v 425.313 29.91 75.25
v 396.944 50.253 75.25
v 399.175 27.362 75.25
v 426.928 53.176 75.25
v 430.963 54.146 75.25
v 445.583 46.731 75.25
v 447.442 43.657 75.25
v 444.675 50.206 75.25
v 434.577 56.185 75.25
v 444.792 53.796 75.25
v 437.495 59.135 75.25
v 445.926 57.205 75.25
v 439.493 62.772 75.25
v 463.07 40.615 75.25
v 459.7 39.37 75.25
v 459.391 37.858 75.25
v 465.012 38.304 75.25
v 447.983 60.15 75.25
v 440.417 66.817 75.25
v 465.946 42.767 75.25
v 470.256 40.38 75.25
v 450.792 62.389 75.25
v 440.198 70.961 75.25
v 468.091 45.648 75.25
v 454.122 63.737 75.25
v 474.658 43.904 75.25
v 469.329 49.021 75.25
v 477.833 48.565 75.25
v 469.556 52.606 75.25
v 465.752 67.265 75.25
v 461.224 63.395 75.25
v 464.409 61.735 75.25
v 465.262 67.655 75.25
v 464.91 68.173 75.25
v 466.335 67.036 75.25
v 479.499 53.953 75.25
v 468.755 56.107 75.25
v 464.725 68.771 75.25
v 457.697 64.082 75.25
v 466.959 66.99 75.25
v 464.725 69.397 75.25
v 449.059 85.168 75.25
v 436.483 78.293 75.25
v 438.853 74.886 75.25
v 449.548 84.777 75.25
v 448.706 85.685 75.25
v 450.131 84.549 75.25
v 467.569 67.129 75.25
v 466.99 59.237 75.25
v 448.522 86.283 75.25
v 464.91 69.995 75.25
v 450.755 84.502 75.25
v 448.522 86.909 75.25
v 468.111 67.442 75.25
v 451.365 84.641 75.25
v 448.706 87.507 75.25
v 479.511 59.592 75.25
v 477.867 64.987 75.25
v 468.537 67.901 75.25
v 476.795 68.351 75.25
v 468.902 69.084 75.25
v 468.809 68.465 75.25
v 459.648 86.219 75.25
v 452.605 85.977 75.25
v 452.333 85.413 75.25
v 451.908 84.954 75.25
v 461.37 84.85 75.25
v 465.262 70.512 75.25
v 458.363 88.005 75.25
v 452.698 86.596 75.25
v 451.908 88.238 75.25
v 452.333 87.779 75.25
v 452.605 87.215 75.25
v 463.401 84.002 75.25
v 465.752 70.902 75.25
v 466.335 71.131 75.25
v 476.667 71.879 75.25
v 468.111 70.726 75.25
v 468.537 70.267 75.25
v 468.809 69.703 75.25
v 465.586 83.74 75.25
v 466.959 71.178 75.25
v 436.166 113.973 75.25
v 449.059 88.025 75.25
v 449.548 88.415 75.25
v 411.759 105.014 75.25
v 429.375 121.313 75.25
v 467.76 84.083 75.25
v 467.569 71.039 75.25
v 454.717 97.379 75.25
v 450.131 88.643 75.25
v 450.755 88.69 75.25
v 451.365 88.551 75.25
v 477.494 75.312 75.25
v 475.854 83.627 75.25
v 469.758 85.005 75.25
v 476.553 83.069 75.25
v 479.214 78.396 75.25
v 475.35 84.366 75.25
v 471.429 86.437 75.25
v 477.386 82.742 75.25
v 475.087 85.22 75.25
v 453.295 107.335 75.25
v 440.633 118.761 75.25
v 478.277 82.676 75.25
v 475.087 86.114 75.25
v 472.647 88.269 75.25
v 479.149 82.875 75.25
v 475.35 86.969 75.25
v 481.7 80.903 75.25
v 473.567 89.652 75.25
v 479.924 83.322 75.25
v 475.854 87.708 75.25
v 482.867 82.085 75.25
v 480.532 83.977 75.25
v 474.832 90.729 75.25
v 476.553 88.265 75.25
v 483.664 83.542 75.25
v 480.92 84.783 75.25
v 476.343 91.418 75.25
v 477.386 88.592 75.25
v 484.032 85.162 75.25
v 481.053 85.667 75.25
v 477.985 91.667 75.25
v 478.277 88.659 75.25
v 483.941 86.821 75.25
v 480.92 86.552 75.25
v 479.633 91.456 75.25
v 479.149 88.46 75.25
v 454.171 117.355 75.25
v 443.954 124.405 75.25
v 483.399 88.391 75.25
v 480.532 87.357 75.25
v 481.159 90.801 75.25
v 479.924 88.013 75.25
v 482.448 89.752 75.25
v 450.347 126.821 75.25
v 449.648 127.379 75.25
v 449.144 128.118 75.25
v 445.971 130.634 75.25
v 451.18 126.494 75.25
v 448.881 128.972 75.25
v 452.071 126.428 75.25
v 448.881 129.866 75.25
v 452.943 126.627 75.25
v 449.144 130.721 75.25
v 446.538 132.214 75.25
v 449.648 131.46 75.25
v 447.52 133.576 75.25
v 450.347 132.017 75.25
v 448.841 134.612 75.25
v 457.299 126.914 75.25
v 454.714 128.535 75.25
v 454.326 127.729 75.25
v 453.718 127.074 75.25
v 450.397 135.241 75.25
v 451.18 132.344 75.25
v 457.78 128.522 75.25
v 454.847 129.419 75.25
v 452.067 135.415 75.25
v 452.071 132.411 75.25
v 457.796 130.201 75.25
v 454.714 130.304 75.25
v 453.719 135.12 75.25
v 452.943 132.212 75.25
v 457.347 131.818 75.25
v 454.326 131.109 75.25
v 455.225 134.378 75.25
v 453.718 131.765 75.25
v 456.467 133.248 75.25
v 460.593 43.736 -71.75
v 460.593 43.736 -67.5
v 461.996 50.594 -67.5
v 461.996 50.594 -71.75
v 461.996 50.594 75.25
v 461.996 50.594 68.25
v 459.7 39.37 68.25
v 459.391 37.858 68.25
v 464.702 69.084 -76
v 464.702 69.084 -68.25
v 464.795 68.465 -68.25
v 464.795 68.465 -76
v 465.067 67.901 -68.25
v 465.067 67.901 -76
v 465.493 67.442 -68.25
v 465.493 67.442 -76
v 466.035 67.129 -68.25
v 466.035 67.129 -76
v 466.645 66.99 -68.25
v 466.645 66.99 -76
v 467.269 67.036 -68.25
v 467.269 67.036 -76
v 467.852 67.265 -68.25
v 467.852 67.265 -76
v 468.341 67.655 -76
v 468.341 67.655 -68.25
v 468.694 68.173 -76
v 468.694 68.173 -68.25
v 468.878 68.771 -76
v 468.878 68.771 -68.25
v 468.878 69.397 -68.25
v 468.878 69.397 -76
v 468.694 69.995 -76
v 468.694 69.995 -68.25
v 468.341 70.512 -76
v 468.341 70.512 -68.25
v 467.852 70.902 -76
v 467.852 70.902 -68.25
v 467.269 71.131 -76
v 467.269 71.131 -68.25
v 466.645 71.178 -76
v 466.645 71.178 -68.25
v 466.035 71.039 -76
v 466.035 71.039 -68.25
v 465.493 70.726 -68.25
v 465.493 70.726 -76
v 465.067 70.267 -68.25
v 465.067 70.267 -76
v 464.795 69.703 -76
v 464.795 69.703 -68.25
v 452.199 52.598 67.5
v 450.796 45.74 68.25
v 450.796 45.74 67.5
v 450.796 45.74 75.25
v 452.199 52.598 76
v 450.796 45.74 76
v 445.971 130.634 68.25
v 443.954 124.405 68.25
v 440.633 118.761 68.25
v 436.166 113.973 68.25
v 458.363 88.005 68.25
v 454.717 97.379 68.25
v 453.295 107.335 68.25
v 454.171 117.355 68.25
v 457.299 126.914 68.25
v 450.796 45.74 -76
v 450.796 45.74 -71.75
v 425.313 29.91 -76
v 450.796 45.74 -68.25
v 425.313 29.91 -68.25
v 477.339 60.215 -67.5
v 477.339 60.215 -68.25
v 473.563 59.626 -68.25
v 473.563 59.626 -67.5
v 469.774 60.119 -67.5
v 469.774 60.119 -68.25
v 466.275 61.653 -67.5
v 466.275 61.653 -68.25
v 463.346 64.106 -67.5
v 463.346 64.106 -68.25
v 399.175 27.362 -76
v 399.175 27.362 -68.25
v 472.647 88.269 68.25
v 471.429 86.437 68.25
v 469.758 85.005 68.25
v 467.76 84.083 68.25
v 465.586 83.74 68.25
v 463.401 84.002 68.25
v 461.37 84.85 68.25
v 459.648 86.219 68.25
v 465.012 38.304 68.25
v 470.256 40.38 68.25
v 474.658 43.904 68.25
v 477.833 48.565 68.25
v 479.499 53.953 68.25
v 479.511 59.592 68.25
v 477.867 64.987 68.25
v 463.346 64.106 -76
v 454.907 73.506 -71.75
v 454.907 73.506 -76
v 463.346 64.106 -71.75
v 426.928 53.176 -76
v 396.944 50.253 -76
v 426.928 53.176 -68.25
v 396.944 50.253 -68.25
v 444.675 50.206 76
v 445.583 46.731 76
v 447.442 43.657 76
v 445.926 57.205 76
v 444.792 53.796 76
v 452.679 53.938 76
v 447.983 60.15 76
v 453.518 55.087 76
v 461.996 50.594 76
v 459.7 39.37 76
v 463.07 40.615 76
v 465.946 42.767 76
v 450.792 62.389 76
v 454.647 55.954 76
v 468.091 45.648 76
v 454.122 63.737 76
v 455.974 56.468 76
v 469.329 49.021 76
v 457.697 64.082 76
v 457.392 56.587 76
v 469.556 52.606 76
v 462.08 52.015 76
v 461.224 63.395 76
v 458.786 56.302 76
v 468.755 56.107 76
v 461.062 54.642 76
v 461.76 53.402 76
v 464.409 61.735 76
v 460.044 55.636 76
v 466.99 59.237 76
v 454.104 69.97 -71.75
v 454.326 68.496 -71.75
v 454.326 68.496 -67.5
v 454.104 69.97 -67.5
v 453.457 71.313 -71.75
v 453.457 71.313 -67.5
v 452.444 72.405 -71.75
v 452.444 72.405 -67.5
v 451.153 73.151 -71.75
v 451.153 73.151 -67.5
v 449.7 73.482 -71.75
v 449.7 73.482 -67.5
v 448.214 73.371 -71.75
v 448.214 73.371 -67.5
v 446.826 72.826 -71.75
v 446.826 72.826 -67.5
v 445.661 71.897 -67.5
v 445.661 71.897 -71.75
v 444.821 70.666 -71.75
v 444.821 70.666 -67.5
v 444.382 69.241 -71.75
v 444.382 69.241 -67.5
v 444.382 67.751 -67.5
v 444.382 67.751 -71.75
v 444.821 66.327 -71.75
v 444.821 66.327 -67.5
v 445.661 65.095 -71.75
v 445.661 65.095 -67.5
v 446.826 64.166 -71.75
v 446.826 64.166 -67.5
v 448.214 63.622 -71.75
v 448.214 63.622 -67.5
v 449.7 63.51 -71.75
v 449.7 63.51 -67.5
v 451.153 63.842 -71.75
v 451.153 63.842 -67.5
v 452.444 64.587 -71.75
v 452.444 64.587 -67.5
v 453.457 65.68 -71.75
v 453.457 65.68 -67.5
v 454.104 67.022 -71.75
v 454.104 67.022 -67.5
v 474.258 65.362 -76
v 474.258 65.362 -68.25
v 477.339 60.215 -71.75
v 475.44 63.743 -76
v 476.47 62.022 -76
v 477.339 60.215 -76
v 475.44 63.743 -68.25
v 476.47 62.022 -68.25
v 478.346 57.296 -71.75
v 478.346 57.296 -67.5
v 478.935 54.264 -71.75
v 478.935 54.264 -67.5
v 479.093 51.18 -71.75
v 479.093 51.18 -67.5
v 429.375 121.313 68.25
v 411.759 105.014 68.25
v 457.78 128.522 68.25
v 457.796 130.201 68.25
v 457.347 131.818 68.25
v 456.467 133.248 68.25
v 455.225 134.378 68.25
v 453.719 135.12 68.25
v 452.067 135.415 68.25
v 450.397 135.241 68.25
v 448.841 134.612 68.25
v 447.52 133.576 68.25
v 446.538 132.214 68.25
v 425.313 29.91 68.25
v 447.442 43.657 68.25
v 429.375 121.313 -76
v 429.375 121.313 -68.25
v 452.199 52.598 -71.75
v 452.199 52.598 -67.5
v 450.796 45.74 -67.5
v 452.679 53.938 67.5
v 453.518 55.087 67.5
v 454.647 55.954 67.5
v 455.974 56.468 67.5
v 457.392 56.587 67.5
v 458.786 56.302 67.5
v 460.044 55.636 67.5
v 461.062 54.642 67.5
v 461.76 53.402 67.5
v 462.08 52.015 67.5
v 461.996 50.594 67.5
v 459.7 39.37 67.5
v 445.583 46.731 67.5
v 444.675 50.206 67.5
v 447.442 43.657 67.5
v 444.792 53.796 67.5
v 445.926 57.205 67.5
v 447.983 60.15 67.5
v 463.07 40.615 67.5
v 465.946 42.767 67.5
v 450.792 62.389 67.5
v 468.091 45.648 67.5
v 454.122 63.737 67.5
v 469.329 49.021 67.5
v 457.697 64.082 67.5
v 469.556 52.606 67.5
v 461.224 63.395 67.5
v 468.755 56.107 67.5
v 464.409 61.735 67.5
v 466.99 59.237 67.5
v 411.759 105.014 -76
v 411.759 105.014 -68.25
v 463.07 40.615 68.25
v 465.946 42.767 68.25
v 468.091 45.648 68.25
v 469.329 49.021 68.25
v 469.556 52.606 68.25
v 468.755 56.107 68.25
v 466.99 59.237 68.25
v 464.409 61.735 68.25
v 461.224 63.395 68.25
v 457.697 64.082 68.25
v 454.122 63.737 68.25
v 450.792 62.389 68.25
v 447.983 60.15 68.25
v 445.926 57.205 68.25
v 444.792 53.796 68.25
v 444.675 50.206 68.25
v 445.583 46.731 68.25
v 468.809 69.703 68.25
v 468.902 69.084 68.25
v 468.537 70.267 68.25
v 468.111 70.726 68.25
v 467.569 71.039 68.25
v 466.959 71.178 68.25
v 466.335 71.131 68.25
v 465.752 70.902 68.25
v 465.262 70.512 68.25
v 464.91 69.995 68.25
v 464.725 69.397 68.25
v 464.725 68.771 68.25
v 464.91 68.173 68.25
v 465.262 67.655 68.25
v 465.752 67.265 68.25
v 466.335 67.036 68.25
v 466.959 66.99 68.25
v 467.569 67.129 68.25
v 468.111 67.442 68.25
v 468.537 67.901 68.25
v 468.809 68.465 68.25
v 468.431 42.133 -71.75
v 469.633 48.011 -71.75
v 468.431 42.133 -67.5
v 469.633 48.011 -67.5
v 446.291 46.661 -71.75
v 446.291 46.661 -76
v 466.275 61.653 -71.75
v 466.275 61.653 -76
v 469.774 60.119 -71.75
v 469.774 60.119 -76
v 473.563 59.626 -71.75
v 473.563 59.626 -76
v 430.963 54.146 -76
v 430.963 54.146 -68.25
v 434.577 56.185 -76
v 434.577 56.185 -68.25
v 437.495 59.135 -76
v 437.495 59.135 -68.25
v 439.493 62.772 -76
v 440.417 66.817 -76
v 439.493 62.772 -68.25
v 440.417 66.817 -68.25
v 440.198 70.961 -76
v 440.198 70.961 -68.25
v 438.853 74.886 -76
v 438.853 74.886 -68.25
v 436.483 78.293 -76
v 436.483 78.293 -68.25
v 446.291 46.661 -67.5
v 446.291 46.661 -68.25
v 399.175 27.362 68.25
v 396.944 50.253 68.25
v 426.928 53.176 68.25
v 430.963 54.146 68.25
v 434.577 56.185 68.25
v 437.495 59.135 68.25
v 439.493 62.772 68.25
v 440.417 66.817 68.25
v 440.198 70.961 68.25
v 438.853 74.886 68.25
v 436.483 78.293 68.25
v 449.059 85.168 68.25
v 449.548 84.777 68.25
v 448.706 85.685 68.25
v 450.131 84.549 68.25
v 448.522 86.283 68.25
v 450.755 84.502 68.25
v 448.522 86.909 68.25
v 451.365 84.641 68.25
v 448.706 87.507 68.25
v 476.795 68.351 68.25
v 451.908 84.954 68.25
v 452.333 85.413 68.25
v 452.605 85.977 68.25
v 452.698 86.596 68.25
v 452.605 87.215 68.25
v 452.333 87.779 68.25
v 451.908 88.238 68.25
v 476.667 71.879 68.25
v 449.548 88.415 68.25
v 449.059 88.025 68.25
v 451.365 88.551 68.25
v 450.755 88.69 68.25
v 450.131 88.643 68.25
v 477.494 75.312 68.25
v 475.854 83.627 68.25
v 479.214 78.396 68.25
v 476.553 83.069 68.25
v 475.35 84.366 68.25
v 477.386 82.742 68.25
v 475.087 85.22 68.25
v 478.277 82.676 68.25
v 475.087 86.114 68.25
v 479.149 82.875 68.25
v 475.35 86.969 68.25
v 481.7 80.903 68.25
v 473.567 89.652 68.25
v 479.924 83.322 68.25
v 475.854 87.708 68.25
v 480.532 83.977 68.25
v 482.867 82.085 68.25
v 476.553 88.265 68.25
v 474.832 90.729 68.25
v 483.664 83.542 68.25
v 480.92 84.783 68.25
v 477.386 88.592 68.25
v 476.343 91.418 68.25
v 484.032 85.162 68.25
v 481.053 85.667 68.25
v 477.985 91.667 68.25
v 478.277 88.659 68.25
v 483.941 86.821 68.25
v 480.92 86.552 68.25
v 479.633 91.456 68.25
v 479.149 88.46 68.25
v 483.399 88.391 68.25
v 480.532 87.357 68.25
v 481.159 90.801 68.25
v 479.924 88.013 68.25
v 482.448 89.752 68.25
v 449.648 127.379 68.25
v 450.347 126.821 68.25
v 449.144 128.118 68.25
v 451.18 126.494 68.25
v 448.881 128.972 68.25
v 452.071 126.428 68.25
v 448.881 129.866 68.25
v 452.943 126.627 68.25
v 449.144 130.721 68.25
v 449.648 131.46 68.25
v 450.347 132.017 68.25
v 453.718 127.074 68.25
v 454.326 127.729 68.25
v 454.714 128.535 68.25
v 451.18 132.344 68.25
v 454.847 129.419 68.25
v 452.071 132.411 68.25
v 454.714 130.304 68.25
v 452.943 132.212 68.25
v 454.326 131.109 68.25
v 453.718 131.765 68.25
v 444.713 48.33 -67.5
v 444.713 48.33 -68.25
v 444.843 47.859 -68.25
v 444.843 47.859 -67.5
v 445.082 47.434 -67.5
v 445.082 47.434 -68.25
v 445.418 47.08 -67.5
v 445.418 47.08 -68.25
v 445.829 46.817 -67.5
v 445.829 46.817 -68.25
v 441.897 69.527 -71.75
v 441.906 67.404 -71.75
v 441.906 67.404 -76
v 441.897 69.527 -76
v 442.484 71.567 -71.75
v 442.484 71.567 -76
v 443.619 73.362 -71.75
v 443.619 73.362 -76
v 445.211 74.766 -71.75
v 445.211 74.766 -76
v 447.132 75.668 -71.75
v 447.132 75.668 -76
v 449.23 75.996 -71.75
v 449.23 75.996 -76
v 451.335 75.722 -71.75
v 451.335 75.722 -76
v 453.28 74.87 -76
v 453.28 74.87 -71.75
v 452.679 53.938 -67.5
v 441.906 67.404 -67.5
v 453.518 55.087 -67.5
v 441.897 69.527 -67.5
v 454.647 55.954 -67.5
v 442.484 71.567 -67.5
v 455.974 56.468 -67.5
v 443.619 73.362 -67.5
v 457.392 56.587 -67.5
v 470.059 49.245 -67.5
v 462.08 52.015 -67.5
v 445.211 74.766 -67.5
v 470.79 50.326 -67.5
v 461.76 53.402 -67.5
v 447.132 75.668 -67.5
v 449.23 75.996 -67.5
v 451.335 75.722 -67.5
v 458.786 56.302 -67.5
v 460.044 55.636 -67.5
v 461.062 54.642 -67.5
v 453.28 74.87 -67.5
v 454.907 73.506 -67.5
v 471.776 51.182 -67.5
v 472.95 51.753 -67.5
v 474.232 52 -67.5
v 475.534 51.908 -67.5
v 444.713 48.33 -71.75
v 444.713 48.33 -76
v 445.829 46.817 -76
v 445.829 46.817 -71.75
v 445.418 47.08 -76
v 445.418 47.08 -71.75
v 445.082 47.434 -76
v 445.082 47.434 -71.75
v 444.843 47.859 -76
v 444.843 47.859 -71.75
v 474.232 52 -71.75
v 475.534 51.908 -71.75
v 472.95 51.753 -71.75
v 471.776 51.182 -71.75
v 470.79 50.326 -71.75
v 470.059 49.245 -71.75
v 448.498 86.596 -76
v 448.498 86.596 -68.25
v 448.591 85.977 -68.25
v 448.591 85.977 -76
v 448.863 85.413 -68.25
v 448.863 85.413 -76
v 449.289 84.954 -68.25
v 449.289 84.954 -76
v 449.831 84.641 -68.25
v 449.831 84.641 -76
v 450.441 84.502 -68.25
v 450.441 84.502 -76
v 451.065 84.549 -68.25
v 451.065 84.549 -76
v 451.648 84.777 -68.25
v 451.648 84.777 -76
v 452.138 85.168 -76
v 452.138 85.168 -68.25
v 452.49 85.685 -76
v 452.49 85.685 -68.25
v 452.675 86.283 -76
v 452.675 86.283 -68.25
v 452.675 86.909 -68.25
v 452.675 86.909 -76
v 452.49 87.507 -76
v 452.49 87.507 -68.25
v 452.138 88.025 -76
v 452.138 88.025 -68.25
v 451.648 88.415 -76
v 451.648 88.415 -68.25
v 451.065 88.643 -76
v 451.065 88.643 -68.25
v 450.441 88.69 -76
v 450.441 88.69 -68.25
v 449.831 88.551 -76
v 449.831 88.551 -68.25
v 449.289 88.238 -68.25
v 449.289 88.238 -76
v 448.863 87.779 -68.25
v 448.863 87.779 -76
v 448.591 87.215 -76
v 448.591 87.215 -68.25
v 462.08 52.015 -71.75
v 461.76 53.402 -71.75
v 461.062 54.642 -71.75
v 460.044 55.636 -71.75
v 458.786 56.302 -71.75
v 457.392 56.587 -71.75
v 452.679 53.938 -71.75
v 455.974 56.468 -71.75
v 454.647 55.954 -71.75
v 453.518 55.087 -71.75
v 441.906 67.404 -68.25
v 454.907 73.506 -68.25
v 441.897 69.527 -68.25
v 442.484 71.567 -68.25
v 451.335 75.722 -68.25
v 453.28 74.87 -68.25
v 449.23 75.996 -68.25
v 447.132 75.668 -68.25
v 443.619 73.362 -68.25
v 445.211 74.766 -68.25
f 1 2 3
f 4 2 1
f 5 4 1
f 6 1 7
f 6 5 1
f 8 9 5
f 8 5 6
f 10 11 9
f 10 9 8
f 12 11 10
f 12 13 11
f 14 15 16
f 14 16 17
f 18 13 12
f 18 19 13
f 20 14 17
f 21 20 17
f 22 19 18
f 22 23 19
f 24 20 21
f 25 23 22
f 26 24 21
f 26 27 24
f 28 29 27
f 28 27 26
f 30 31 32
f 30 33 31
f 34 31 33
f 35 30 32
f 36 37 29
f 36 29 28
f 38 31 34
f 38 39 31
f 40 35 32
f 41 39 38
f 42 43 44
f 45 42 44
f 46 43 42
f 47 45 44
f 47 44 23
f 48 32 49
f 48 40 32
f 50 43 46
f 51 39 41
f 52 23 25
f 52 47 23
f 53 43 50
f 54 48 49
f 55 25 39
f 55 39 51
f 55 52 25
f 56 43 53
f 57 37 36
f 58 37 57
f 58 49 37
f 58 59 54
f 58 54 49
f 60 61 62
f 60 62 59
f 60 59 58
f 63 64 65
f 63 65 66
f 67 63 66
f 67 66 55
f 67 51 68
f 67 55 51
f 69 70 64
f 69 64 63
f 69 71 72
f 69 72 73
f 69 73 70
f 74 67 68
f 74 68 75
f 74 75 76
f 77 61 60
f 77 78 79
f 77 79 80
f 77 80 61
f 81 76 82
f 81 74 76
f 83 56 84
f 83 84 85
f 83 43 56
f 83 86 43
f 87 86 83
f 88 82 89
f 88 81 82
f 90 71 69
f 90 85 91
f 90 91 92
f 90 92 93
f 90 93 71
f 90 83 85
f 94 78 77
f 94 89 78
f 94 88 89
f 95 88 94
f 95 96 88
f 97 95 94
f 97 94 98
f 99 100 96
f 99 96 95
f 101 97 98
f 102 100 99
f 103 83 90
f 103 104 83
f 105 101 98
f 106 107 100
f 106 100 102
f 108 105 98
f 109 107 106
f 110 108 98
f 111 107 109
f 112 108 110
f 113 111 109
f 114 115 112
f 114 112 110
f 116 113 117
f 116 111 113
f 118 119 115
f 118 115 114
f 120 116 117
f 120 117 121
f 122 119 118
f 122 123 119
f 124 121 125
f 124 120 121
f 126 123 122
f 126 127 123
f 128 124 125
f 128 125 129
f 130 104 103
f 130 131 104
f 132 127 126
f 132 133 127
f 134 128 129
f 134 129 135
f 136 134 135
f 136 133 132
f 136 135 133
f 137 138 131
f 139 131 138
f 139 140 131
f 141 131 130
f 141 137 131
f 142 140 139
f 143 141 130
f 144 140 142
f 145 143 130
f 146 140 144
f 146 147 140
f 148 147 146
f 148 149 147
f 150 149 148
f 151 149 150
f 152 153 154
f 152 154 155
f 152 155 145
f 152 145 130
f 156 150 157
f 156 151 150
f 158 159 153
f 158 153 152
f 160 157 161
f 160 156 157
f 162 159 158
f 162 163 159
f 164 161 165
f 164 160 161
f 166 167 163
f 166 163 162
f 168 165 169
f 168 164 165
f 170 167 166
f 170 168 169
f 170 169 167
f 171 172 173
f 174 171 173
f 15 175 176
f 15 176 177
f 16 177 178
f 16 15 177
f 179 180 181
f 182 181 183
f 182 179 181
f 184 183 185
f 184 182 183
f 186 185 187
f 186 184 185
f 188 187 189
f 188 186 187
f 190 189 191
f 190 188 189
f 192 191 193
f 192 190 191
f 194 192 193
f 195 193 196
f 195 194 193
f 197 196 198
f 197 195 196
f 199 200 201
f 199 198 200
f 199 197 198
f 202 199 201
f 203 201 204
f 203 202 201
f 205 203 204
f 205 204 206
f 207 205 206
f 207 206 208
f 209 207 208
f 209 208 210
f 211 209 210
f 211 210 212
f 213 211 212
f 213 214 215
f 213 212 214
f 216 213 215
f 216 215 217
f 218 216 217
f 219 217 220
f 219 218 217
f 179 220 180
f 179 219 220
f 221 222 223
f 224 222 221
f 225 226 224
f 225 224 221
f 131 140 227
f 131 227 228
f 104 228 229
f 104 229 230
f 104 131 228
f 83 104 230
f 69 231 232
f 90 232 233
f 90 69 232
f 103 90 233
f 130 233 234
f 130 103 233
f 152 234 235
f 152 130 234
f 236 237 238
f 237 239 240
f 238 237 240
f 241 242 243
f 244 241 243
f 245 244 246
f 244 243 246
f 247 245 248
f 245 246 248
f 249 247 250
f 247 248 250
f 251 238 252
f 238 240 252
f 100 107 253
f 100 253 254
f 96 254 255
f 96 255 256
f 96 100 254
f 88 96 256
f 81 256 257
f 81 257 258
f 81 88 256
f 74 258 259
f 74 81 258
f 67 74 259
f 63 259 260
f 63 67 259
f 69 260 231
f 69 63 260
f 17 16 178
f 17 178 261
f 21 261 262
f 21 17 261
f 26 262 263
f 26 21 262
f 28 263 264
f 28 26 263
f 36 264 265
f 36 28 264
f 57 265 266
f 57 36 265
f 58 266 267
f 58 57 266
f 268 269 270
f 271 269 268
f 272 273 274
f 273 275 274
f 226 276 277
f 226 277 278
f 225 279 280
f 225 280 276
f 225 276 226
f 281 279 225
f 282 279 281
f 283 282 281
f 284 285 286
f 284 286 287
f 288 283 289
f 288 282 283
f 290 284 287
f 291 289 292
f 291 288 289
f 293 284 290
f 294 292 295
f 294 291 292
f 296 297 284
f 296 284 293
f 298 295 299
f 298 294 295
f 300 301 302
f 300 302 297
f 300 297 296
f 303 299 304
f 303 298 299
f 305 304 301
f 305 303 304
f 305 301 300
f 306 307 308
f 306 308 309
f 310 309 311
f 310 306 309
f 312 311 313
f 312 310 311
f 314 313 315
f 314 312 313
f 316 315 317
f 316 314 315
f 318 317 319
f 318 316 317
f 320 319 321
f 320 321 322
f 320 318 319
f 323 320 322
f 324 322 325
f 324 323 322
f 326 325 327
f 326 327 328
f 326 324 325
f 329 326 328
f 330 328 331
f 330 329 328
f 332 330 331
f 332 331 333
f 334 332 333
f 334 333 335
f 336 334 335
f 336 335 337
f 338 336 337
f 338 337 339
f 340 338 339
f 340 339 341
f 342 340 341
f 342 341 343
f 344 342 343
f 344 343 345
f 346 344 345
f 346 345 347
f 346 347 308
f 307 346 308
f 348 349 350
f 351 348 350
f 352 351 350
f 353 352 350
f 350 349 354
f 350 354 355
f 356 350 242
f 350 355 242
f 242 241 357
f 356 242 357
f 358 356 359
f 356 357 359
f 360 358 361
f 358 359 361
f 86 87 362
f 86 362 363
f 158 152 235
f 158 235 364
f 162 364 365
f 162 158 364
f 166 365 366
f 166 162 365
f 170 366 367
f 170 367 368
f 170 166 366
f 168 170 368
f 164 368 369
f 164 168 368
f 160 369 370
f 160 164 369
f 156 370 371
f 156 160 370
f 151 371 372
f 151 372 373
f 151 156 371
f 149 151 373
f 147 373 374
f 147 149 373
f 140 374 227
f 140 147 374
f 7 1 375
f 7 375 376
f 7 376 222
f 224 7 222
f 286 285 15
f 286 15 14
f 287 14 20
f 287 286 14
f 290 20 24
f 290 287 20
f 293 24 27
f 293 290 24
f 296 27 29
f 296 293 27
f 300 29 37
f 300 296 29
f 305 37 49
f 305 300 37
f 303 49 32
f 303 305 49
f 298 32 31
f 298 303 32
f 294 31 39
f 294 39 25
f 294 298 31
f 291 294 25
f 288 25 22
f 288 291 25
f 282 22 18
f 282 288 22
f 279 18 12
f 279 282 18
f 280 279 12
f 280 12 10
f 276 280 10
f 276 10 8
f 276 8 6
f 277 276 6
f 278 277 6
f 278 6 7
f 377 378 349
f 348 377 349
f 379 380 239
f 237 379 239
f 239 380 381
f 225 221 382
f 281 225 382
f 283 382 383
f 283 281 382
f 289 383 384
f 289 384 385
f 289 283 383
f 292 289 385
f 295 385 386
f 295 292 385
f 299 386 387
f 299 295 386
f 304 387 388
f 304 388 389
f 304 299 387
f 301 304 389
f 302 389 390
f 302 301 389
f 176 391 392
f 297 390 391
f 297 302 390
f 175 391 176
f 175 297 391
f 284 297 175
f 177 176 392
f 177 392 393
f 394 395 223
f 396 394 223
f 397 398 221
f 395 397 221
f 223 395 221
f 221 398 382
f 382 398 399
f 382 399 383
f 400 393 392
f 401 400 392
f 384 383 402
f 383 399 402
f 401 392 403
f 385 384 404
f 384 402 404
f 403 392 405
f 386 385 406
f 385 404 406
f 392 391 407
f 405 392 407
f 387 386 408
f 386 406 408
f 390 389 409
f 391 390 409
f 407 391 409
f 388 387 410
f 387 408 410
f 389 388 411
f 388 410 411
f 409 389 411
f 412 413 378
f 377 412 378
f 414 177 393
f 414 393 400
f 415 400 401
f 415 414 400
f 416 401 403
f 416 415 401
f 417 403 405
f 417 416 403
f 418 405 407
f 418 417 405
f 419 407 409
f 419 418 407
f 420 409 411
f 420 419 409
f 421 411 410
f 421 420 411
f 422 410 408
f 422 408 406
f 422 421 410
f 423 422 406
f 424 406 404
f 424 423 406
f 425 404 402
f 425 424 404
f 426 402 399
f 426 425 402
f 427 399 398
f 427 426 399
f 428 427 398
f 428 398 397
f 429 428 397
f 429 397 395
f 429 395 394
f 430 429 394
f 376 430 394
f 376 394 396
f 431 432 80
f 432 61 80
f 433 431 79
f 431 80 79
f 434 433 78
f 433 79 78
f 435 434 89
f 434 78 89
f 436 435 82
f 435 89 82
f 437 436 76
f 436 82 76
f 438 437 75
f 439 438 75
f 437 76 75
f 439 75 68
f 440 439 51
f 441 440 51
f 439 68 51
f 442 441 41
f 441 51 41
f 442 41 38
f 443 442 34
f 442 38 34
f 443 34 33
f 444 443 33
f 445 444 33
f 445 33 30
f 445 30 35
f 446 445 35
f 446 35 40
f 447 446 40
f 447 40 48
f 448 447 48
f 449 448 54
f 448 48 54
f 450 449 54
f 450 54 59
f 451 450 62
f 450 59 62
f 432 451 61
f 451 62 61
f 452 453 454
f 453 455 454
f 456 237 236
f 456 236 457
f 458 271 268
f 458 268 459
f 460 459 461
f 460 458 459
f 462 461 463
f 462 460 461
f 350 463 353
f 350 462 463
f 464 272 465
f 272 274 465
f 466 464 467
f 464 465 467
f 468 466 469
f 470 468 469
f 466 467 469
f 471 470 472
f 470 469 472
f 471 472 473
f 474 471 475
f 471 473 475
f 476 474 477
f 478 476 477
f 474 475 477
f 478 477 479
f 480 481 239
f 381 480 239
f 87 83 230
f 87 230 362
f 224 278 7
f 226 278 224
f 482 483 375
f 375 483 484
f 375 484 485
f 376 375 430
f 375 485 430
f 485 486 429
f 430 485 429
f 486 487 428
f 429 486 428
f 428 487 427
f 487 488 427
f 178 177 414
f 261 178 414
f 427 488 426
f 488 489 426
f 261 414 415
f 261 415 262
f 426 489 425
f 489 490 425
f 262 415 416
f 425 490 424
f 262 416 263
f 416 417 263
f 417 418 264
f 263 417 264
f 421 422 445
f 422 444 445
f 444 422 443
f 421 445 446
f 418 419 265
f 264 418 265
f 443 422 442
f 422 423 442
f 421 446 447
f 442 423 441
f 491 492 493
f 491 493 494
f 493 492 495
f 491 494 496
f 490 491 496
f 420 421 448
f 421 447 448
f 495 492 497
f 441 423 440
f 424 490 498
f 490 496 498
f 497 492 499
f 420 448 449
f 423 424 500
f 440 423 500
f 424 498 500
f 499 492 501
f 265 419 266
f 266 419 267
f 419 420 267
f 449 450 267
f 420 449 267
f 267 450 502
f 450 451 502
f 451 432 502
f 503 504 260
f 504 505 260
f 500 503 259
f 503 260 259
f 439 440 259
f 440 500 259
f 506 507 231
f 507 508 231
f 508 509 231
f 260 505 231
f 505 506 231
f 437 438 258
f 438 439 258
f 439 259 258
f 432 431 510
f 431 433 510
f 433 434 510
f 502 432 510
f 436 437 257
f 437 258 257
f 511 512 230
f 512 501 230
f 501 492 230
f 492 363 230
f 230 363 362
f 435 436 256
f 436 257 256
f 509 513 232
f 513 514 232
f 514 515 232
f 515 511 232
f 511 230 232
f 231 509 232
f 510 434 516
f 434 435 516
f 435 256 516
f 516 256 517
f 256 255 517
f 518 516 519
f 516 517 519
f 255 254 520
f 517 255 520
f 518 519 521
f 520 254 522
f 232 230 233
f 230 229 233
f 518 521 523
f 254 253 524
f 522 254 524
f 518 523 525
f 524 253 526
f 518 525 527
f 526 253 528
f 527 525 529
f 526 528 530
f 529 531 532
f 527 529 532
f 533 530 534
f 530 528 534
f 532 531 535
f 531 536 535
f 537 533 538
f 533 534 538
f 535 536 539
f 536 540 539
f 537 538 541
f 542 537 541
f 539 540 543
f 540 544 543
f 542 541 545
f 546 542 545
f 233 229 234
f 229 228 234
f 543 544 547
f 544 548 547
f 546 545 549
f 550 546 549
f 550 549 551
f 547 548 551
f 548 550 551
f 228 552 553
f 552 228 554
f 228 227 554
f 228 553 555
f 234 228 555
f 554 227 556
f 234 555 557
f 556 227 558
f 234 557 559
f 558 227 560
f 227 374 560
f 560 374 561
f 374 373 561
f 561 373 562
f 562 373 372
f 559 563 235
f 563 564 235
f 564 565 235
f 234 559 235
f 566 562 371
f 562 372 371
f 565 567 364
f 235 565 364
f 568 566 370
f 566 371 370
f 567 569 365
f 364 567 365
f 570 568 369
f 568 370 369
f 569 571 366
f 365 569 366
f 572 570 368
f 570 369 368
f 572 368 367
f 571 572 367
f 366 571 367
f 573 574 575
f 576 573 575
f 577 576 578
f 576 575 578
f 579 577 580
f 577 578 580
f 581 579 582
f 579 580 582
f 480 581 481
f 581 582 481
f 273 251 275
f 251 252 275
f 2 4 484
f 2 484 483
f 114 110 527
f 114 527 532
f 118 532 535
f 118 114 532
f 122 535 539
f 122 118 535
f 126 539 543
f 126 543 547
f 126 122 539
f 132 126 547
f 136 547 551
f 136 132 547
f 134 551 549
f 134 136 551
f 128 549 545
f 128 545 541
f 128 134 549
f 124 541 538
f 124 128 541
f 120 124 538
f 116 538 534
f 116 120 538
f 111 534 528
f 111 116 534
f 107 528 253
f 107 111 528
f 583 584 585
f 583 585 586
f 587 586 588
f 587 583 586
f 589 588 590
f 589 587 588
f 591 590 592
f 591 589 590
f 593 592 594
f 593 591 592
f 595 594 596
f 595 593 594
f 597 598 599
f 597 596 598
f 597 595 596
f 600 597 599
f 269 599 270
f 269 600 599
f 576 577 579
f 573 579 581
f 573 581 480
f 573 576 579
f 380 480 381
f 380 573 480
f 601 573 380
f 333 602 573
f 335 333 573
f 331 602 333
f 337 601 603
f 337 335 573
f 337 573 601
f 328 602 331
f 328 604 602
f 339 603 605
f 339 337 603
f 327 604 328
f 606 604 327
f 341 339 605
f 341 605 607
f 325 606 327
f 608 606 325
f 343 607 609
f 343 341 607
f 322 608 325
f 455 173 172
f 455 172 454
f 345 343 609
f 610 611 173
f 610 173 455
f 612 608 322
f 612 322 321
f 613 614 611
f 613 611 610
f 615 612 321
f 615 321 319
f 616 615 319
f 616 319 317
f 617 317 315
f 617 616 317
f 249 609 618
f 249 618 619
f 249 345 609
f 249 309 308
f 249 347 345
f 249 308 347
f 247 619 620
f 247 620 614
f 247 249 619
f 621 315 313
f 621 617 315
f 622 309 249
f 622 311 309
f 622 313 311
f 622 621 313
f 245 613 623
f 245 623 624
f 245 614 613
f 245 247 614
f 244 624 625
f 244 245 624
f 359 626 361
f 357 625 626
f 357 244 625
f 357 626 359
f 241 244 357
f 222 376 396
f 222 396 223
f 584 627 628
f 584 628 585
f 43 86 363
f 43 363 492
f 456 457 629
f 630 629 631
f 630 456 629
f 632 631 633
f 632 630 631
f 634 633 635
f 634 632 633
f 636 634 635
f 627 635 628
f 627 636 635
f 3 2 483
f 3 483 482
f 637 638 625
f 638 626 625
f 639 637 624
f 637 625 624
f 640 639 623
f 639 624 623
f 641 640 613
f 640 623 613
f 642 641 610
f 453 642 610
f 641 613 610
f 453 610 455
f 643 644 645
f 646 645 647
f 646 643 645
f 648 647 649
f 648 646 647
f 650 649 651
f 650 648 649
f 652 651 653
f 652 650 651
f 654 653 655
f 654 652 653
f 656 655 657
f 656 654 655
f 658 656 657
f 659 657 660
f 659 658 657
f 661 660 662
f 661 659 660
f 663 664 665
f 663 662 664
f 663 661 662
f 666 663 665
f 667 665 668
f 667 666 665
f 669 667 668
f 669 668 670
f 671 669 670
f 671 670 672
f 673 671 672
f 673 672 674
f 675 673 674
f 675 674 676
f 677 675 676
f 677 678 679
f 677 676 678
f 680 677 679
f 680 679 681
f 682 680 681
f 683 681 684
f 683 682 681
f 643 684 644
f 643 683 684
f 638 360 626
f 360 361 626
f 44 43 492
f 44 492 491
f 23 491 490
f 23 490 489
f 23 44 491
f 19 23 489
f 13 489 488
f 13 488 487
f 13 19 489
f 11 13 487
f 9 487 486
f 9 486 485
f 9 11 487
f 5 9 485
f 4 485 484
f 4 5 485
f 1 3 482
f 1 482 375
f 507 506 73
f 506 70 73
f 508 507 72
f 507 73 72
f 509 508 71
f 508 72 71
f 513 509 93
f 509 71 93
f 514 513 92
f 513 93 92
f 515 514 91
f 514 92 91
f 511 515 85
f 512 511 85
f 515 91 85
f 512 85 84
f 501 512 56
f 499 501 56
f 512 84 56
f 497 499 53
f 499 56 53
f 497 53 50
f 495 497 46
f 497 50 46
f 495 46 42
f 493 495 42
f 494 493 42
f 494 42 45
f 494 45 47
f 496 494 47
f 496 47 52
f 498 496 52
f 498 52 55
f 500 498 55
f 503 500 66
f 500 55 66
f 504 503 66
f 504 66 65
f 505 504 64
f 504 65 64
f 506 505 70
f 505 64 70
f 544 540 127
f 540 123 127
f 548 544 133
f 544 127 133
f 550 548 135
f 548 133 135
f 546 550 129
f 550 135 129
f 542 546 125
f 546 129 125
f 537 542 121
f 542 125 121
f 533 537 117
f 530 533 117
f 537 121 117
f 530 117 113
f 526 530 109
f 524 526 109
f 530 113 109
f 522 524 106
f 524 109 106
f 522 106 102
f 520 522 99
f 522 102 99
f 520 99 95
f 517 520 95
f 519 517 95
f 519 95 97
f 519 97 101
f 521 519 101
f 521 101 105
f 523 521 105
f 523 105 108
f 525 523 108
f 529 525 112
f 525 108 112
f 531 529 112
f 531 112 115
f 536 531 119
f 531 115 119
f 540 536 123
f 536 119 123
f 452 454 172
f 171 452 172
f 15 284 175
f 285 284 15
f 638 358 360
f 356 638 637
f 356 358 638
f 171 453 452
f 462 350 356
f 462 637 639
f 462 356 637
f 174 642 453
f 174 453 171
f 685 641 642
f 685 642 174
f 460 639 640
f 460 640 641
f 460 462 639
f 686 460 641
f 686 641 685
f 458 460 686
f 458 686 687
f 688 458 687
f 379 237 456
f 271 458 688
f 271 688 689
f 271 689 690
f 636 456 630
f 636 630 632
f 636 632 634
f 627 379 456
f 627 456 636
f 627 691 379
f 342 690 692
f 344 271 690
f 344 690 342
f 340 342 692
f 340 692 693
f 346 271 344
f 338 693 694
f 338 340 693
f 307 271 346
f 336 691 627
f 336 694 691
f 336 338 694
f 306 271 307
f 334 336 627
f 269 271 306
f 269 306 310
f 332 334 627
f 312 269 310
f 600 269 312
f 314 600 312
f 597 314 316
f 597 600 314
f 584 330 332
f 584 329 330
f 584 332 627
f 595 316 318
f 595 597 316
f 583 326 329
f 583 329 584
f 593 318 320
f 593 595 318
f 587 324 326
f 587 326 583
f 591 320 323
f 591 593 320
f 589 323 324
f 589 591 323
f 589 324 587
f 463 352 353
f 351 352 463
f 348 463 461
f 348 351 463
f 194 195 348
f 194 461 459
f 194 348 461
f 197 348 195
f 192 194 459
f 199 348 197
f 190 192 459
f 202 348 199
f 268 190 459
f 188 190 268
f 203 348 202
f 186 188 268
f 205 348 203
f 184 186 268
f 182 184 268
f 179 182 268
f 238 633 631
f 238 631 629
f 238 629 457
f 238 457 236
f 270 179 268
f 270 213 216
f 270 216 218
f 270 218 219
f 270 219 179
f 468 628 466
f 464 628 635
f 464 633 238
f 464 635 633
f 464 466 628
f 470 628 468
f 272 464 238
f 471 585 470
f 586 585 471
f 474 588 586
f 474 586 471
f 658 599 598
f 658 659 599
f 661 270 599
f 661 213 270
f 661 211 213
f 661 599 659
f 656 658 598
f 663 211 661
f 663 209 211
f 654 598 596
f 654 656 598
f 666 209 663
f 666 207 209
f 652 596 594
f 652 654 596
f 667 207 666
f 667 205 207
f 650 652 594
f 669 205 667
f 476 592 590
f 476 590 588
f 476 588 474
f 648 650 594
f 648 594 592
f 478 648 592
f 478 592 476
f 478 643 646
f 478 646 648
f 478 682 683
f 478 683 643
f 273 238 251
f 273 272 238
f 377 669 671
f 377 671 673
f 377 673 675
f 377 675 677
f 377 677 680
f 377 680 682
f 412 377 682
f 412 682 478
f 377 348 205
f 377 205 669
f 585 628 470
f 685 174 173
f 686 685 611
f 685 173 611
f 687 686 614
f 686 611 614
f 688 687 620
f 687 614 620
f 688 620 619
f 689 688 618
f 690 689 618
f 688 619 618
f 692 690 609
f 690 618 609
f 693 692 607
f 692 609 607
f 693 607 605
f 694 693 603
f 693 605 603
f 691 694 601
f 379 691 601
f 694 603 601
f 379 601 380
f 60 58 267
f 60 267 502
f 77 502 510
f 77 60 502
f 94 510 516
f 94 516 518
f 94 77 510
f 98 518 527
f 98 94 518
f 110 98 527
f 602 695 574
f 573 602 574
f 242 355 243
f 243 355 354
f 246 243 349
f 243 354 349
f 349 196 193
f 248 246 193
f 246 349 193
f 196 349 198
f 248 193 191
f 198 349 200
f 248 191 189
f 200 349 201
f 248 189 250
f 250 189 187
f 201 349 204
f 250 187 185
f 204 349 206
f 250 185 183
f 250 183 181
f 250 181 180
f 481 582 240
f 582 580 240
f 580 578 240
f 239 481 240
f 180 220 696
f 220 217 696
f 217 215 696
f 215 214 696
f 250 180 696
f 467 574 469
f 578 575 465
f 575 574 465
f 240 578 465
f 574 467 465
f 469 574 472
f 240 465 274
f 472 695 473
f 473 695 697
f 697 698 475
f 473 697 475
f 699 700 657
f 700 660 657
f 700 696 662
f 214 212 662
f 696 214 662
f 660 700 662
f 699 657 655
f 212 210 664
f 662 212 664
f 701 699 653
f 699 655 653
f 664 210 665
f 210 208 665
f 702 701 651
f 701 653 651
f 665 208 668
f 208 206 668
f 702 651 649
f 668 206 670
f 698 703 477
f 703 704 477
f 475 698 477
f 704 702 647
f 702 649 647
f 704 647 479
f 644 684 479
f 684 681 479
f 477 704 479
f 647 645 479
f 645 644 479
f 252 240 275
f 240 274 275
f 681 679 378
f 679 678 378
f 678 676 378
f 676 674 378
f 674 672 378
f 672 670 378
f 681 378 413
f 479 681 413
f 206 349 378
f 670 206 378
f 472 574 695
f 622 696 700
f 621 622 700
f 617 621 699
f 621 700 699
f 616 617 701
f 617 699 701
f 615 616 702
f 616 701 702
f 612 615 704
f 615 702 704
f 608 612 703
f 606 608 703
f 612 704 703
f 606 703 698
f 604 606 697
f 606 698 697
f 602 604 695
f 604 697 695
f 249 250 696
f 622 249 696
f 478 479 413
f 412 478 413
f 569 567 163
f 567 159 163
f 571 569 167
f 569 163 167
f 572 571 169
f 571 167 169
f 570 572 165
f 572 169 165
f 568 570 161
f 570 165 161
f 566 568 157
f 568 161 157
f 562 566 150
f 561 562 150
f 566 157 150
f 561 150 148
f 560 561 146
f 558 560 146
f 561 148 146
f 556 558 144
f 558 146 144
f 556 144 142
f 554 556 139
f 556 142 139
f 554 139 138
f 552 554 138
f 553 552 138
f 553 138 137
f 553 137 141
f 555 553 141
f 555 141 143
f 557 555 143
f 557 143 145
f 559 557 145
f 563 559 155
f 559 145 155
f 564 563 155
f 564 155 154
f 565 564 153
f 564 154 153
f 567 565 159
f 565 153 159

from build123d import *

# Parameters (mm, degrees)
EXTRUSION8_DEPTH             = 3.5
ESQUISSE25_R                 = 2.1
ESQUISSE25_R_2               = 3
ENL_V_MAT_EXTRU_7_DEPTH      = 4.5
ENL_V_MAT_EXTRU_7_DEPTH_BACK = 4.5
EXTRUSION9_DEPTH             = 4.25
EXTRUSION10_DEPTH            = 3.5
EXTRUSION10_DEPTH_BACK       = 4.25
ENL_V_MAT_EXTRU_8_DEPTH      = 5.25
EXTRUSION11_DEPTH            = 4.25
ENL_V_START                  = -4.25
ESQUISSE29_R                 = 5
ESQUISSE29_R_2               = 2.1
ENL_V_MAT_EXTRU_9_DEPTH      = 8.5


with BuildPart() as part:
    # Esquisse24 → Extrusion8 (new body, symmetric)
    with BuildSketch(Plane.XY.offset(71.75)):
        with BuildLine():
            Line((461.995766883, 50.594183039), (459.390681209, 37.857875543))
            ThreePointArc((459.390681209, 37.857875543), (476.419566024, 46.116324353), (477.86706581, 64.986661902))
            ThreePointArc((477.86706581, 64.986661902), (476.963568853, 73.623976526), (481.700303248, 80.902908999))
            ThreePointArc((481.700303248, 80.902908999), (481.840076705, 90.321321022), (472.646856003, 88.269318395))
            ThreePointArc((472.646856003, 88.269318395), (465.58603542, 83.740072967), (458.362772931, 88.005483904))
            ThreePointArc((458.362772931, 88.005483904), (453.294594284, 107.335459009), (457.298805353, 126.913524952))
            ThreePointArc((457.298805353, 126.913524952), (453.719385793, 135.119639281), (445.971344073, 130.634061698))
            ThreePointArc((445.971344073, 130.634061698), (442.447554772, 121.492162619), (436.166159284, 113.97315467))
            Line((436.166159284, 113.97315467), (429.374657578, 121.313148169))
            Line((429.374657578, 121.313148169), (411.758673179, 105.013544073))
            Line((411.758673179, 105.013544073), (436.482729278, 78.292736383))
            ThreePointArc((436.482729278, 78.292736383), (439.492589592, 62.772211826), (426.92820657, 53.176263674))
            Line((426.92820657, 53.176263674), (396.943666221, 50.253034947))
            Line((396.943666221, 50.253034947), (399.175383117, 27.361564053))
            Line((399.175383117, 27.361564053), (425.312556128, 29.909708333))
            Line((425.312556128, 29.909708333), (450.795868831, 45.740083367))
            Line((450.795868831, 45.740083367), (452.19860727, 52.598095095))
            ThreePointArc((452.19860727, 52.598095095), (458.099143105, 56.494718873), (461.995766883, 50.594183039))
        make_face()
    extrude(amount=EXTRUSION8_DEPTH, both=True)

    # Esquisse25 → Enlèv. mat.-Extru.7 (cut, two sides)
    with BuildSketch(Plane.XY.offset(71.75)) as enl_v_mat_extru_7_sk:
        with Locations((466.801883269, 69.083816781)):
            Circle(ESQUISSE25_R)
        with Locations((451.847076239, 129.419248335)):
            Circle(ESQUISSE25_R_2)
        with Locations((450.598194981, 86.596139067)):
            Circle(ESQUISSE25_R)
        with Locations((478.053275681, 85.667275685)):
            Circle(ESQUISSE25_R_2)
    extrude(amount=ENL_V_MAT_EXTRU_7_DEPTH, mode=Mode.SUBTRACT)
    extrude(enl_v_mat_extru_7_sk.sketch, amount=-ENL_V_MAT_EXTRU_7_DEPTH_BACK, mode=Mode.SUBTRACT)

    # Esquisse26 → Extrusion9 (add, symmetric)
    with BuildSketch(Plane.XY.offset(71.75)):
        with BuildLine():
            Line((461.995766883, 50.594183039), (459.699997211, 39.370126659))
            ThreePointArc((459.699997211, 39.370126659), (461.22355789, 63.395421414), (447.442283114, 43.65681734))
            Line((447.442283114, 43.65681734), (450.795868831, 45.740083367))
            Line((450.795868831, 45.740083367), (452.19860727, 52.598095095))
            ThreePointArc((452.19860727, 52.598095095), (458.099143105, 56.494718873), (461.995766883, 50.594183039))
        make_face()
    extrude(amount=EXTRUSION9_DEPTH, both=True)


with BuildPart() as body_2:
    # Esquisse27 → Extrusion10 (new body, two sides)
    with BuildSketch(Plane.XY.offset(-71.75)) as extrusion10_sk:
        with BuildLine():
            Line((429.374657578, 121.313148169), (474.257936186, 65.362354597))
            ThreePointArc((474.257936186, 65.362354597), (477.920241971, 58.695461914), (479.093248701, 51.179878309))
            Line((479.093248701, 51.179878309), (475.533639201, 51.90796121))
            ThreePointArc((475.533639201, 51.90796121), (471.776354076, 51.181690305), (469.633103367, 48.011337432))
            Line((469.633103367, 48.011337432), (468.430756133, 42.133041665))
            Line((468.430756133, 42.133041665), (460.593028443, 43.73617131))
            Line((460.593028443, 43.73617131), (461.995766883, 50.594183039))
            ThreePointArc((461.995766883, 50.594183039), (458.099143105, 56.494718873), (452.19860727, 52.598095095))
            Line((452.19860727, 52.598095095), (450.795868831, 45.740083367))
            Line((450.795868831, 45.740083367), (425.312556128, 29.909708333))
            Line((425.312556128, 29.909708333), (399.175383117, 27.361564053))
            Line((399.175383117, 27.361564053), (396.943666221, 50.253034947))
            Line((396.943666221, 50.253034947), (426.92820657, 53.176263674))
            ThreePointArc((426.92820657, 53.176263674), (439.492589592, 62.772211826), (436.482729278, 78.292736383))
            Line((436.482729278, 78.292736383), (411.758673179, 105.013544073))
            Line((411.758673179, 105.013544073), (429.374657578, 121.313148169))
        make_face()
    extrude(amount=EXTRUSION10_DEPTH)
    extrude(extrusion10_sk.sketch, amount=-EXTRUSION10_DEPTH_BACK)

    # Esquisse31 → Enlèv. mat.-Extru.8 (cut, through all)
    with BuildSketch(Plane.XY.offset(-71.75)):
        with BuildLine():
            Line((444.713406132, 48.32966438), (441.906110824, 67.404128849))
            ThreePointArc((441.906110824, 67.404128849), (446.1394526, 75.285494755), (454.907130769, 73.506469556))
            Line((454.907130769, 73.506469556), (463.346068037, 64.106351495))
            ThreePointArc((463.346068037, 64.106351495), (469.774472357, 60.118521705), (477.338724598, 60.214732849))
            ThreePointArc((477.338724598, 60.214732849), (478.693734128, 55.790081778), (479.093248701, 51.179878309))
            Line((479.093248701, 51.179878309), (475.533639201, 51.90796121))
            ThreePointArc((475.533639201, 51.90796121), (471.776354076, 51.181690305), (469.633103367, 48.011337432))
            Line((469.633103367, 48.011337432), (468.430756133, 42.133041665))
            Line((468.430756133, 42.133041665), (446.291308724, 46.661446564))
            ThreePointArc((446.291308724, 46.661446564), (445.239092868, 47.246543726), (444.713406132, 48.32966438))
        make_face()
    extrude(amount=-ENL_V_MAT_EXTRU_8_DEPTH, mode=Mode.SUBTRACT)

    # Esquisse32 → Extrusion11 (add)
    with BuildSketch(Plane.XY.offset(-71.75)):
        with BuildLine():
            Line((446.291308724, 46.661446564), (450.795868831, 45.740083367))
            Line((450.795868831, 45.740083367), (452.19860727, 52.598095095))
            ThreePointArc((452.19860727, 52.598095095), (458.099143105, 56.494718873), (461.995766883, 50.594183039))
            Line((461.995766883, 50.594183039), (460.593028443, 43.73617131))
            Line((460.593028443, 43.73617131), (468.430756133, 42.133041665))
            Line((468.430756133, 42.133041665), (469.633103367, 48.011337432))
            ThreePointArc((469.633103367, 48.011337432), (471.776354076, 51.181690305), (475.533639201, 51.90796121))
            Line((475.533639201, 51.90796121), (479.093248701, 51.179878309))
            ThreePointArc((479.093248701, 51.179878309), (478.693734128, 55.790081778), (477.338724598, 60.214732849))
            ThreePointArc((477.338724598, 60.214732849), (469.774472357, 60.118521705), (463.346068037, 64.106351495))
            Line((463.346068037, 64.106351495), (454.907130769, 73.506469556))
            ThreePointArc((454.907130769, 73.506469556), (446.1394526, 75.285494755), (441.906110824, 67.404128849))
            Line((441.906110824, 67.404128849), (444.713406132, 48.32966438))
            ThreePointArc((444.713406132, 48.32966438), (445.239092868, 47.246543726), (446.291308724, 46.661446564))
        make_face()
    extrude(amount=EXTRUSION11_DEPTH)

    # Esquisse29 → Enlèv. mat.-Extru.9 (cut)
    with BuildSketch(Plane.XY.offset(-71.75).offset(ENL_V_START)):
        with Locations((449.326179588, 68.496181748)):
            Circle(ESQUISSE29_R)
        with Locations(Location((466.801883269, 69.083816781, 0), (0, 0, 180))):  # turned: the seam where the file's is
            Circle(ESQUISSE29_R_2)
        with Locations(Location((450.598194981, 86.596139067, 0), (0, 0, 180))):  # turned: the seam where the file's is
            Circle(ESQUISSE29_R_2)
    extrude(amount=ENL_V_MAT_EXTRU_9_DEPTH, mode=Mode.SUBTRACT)


solid = Compound([part.part, body_2.part])
